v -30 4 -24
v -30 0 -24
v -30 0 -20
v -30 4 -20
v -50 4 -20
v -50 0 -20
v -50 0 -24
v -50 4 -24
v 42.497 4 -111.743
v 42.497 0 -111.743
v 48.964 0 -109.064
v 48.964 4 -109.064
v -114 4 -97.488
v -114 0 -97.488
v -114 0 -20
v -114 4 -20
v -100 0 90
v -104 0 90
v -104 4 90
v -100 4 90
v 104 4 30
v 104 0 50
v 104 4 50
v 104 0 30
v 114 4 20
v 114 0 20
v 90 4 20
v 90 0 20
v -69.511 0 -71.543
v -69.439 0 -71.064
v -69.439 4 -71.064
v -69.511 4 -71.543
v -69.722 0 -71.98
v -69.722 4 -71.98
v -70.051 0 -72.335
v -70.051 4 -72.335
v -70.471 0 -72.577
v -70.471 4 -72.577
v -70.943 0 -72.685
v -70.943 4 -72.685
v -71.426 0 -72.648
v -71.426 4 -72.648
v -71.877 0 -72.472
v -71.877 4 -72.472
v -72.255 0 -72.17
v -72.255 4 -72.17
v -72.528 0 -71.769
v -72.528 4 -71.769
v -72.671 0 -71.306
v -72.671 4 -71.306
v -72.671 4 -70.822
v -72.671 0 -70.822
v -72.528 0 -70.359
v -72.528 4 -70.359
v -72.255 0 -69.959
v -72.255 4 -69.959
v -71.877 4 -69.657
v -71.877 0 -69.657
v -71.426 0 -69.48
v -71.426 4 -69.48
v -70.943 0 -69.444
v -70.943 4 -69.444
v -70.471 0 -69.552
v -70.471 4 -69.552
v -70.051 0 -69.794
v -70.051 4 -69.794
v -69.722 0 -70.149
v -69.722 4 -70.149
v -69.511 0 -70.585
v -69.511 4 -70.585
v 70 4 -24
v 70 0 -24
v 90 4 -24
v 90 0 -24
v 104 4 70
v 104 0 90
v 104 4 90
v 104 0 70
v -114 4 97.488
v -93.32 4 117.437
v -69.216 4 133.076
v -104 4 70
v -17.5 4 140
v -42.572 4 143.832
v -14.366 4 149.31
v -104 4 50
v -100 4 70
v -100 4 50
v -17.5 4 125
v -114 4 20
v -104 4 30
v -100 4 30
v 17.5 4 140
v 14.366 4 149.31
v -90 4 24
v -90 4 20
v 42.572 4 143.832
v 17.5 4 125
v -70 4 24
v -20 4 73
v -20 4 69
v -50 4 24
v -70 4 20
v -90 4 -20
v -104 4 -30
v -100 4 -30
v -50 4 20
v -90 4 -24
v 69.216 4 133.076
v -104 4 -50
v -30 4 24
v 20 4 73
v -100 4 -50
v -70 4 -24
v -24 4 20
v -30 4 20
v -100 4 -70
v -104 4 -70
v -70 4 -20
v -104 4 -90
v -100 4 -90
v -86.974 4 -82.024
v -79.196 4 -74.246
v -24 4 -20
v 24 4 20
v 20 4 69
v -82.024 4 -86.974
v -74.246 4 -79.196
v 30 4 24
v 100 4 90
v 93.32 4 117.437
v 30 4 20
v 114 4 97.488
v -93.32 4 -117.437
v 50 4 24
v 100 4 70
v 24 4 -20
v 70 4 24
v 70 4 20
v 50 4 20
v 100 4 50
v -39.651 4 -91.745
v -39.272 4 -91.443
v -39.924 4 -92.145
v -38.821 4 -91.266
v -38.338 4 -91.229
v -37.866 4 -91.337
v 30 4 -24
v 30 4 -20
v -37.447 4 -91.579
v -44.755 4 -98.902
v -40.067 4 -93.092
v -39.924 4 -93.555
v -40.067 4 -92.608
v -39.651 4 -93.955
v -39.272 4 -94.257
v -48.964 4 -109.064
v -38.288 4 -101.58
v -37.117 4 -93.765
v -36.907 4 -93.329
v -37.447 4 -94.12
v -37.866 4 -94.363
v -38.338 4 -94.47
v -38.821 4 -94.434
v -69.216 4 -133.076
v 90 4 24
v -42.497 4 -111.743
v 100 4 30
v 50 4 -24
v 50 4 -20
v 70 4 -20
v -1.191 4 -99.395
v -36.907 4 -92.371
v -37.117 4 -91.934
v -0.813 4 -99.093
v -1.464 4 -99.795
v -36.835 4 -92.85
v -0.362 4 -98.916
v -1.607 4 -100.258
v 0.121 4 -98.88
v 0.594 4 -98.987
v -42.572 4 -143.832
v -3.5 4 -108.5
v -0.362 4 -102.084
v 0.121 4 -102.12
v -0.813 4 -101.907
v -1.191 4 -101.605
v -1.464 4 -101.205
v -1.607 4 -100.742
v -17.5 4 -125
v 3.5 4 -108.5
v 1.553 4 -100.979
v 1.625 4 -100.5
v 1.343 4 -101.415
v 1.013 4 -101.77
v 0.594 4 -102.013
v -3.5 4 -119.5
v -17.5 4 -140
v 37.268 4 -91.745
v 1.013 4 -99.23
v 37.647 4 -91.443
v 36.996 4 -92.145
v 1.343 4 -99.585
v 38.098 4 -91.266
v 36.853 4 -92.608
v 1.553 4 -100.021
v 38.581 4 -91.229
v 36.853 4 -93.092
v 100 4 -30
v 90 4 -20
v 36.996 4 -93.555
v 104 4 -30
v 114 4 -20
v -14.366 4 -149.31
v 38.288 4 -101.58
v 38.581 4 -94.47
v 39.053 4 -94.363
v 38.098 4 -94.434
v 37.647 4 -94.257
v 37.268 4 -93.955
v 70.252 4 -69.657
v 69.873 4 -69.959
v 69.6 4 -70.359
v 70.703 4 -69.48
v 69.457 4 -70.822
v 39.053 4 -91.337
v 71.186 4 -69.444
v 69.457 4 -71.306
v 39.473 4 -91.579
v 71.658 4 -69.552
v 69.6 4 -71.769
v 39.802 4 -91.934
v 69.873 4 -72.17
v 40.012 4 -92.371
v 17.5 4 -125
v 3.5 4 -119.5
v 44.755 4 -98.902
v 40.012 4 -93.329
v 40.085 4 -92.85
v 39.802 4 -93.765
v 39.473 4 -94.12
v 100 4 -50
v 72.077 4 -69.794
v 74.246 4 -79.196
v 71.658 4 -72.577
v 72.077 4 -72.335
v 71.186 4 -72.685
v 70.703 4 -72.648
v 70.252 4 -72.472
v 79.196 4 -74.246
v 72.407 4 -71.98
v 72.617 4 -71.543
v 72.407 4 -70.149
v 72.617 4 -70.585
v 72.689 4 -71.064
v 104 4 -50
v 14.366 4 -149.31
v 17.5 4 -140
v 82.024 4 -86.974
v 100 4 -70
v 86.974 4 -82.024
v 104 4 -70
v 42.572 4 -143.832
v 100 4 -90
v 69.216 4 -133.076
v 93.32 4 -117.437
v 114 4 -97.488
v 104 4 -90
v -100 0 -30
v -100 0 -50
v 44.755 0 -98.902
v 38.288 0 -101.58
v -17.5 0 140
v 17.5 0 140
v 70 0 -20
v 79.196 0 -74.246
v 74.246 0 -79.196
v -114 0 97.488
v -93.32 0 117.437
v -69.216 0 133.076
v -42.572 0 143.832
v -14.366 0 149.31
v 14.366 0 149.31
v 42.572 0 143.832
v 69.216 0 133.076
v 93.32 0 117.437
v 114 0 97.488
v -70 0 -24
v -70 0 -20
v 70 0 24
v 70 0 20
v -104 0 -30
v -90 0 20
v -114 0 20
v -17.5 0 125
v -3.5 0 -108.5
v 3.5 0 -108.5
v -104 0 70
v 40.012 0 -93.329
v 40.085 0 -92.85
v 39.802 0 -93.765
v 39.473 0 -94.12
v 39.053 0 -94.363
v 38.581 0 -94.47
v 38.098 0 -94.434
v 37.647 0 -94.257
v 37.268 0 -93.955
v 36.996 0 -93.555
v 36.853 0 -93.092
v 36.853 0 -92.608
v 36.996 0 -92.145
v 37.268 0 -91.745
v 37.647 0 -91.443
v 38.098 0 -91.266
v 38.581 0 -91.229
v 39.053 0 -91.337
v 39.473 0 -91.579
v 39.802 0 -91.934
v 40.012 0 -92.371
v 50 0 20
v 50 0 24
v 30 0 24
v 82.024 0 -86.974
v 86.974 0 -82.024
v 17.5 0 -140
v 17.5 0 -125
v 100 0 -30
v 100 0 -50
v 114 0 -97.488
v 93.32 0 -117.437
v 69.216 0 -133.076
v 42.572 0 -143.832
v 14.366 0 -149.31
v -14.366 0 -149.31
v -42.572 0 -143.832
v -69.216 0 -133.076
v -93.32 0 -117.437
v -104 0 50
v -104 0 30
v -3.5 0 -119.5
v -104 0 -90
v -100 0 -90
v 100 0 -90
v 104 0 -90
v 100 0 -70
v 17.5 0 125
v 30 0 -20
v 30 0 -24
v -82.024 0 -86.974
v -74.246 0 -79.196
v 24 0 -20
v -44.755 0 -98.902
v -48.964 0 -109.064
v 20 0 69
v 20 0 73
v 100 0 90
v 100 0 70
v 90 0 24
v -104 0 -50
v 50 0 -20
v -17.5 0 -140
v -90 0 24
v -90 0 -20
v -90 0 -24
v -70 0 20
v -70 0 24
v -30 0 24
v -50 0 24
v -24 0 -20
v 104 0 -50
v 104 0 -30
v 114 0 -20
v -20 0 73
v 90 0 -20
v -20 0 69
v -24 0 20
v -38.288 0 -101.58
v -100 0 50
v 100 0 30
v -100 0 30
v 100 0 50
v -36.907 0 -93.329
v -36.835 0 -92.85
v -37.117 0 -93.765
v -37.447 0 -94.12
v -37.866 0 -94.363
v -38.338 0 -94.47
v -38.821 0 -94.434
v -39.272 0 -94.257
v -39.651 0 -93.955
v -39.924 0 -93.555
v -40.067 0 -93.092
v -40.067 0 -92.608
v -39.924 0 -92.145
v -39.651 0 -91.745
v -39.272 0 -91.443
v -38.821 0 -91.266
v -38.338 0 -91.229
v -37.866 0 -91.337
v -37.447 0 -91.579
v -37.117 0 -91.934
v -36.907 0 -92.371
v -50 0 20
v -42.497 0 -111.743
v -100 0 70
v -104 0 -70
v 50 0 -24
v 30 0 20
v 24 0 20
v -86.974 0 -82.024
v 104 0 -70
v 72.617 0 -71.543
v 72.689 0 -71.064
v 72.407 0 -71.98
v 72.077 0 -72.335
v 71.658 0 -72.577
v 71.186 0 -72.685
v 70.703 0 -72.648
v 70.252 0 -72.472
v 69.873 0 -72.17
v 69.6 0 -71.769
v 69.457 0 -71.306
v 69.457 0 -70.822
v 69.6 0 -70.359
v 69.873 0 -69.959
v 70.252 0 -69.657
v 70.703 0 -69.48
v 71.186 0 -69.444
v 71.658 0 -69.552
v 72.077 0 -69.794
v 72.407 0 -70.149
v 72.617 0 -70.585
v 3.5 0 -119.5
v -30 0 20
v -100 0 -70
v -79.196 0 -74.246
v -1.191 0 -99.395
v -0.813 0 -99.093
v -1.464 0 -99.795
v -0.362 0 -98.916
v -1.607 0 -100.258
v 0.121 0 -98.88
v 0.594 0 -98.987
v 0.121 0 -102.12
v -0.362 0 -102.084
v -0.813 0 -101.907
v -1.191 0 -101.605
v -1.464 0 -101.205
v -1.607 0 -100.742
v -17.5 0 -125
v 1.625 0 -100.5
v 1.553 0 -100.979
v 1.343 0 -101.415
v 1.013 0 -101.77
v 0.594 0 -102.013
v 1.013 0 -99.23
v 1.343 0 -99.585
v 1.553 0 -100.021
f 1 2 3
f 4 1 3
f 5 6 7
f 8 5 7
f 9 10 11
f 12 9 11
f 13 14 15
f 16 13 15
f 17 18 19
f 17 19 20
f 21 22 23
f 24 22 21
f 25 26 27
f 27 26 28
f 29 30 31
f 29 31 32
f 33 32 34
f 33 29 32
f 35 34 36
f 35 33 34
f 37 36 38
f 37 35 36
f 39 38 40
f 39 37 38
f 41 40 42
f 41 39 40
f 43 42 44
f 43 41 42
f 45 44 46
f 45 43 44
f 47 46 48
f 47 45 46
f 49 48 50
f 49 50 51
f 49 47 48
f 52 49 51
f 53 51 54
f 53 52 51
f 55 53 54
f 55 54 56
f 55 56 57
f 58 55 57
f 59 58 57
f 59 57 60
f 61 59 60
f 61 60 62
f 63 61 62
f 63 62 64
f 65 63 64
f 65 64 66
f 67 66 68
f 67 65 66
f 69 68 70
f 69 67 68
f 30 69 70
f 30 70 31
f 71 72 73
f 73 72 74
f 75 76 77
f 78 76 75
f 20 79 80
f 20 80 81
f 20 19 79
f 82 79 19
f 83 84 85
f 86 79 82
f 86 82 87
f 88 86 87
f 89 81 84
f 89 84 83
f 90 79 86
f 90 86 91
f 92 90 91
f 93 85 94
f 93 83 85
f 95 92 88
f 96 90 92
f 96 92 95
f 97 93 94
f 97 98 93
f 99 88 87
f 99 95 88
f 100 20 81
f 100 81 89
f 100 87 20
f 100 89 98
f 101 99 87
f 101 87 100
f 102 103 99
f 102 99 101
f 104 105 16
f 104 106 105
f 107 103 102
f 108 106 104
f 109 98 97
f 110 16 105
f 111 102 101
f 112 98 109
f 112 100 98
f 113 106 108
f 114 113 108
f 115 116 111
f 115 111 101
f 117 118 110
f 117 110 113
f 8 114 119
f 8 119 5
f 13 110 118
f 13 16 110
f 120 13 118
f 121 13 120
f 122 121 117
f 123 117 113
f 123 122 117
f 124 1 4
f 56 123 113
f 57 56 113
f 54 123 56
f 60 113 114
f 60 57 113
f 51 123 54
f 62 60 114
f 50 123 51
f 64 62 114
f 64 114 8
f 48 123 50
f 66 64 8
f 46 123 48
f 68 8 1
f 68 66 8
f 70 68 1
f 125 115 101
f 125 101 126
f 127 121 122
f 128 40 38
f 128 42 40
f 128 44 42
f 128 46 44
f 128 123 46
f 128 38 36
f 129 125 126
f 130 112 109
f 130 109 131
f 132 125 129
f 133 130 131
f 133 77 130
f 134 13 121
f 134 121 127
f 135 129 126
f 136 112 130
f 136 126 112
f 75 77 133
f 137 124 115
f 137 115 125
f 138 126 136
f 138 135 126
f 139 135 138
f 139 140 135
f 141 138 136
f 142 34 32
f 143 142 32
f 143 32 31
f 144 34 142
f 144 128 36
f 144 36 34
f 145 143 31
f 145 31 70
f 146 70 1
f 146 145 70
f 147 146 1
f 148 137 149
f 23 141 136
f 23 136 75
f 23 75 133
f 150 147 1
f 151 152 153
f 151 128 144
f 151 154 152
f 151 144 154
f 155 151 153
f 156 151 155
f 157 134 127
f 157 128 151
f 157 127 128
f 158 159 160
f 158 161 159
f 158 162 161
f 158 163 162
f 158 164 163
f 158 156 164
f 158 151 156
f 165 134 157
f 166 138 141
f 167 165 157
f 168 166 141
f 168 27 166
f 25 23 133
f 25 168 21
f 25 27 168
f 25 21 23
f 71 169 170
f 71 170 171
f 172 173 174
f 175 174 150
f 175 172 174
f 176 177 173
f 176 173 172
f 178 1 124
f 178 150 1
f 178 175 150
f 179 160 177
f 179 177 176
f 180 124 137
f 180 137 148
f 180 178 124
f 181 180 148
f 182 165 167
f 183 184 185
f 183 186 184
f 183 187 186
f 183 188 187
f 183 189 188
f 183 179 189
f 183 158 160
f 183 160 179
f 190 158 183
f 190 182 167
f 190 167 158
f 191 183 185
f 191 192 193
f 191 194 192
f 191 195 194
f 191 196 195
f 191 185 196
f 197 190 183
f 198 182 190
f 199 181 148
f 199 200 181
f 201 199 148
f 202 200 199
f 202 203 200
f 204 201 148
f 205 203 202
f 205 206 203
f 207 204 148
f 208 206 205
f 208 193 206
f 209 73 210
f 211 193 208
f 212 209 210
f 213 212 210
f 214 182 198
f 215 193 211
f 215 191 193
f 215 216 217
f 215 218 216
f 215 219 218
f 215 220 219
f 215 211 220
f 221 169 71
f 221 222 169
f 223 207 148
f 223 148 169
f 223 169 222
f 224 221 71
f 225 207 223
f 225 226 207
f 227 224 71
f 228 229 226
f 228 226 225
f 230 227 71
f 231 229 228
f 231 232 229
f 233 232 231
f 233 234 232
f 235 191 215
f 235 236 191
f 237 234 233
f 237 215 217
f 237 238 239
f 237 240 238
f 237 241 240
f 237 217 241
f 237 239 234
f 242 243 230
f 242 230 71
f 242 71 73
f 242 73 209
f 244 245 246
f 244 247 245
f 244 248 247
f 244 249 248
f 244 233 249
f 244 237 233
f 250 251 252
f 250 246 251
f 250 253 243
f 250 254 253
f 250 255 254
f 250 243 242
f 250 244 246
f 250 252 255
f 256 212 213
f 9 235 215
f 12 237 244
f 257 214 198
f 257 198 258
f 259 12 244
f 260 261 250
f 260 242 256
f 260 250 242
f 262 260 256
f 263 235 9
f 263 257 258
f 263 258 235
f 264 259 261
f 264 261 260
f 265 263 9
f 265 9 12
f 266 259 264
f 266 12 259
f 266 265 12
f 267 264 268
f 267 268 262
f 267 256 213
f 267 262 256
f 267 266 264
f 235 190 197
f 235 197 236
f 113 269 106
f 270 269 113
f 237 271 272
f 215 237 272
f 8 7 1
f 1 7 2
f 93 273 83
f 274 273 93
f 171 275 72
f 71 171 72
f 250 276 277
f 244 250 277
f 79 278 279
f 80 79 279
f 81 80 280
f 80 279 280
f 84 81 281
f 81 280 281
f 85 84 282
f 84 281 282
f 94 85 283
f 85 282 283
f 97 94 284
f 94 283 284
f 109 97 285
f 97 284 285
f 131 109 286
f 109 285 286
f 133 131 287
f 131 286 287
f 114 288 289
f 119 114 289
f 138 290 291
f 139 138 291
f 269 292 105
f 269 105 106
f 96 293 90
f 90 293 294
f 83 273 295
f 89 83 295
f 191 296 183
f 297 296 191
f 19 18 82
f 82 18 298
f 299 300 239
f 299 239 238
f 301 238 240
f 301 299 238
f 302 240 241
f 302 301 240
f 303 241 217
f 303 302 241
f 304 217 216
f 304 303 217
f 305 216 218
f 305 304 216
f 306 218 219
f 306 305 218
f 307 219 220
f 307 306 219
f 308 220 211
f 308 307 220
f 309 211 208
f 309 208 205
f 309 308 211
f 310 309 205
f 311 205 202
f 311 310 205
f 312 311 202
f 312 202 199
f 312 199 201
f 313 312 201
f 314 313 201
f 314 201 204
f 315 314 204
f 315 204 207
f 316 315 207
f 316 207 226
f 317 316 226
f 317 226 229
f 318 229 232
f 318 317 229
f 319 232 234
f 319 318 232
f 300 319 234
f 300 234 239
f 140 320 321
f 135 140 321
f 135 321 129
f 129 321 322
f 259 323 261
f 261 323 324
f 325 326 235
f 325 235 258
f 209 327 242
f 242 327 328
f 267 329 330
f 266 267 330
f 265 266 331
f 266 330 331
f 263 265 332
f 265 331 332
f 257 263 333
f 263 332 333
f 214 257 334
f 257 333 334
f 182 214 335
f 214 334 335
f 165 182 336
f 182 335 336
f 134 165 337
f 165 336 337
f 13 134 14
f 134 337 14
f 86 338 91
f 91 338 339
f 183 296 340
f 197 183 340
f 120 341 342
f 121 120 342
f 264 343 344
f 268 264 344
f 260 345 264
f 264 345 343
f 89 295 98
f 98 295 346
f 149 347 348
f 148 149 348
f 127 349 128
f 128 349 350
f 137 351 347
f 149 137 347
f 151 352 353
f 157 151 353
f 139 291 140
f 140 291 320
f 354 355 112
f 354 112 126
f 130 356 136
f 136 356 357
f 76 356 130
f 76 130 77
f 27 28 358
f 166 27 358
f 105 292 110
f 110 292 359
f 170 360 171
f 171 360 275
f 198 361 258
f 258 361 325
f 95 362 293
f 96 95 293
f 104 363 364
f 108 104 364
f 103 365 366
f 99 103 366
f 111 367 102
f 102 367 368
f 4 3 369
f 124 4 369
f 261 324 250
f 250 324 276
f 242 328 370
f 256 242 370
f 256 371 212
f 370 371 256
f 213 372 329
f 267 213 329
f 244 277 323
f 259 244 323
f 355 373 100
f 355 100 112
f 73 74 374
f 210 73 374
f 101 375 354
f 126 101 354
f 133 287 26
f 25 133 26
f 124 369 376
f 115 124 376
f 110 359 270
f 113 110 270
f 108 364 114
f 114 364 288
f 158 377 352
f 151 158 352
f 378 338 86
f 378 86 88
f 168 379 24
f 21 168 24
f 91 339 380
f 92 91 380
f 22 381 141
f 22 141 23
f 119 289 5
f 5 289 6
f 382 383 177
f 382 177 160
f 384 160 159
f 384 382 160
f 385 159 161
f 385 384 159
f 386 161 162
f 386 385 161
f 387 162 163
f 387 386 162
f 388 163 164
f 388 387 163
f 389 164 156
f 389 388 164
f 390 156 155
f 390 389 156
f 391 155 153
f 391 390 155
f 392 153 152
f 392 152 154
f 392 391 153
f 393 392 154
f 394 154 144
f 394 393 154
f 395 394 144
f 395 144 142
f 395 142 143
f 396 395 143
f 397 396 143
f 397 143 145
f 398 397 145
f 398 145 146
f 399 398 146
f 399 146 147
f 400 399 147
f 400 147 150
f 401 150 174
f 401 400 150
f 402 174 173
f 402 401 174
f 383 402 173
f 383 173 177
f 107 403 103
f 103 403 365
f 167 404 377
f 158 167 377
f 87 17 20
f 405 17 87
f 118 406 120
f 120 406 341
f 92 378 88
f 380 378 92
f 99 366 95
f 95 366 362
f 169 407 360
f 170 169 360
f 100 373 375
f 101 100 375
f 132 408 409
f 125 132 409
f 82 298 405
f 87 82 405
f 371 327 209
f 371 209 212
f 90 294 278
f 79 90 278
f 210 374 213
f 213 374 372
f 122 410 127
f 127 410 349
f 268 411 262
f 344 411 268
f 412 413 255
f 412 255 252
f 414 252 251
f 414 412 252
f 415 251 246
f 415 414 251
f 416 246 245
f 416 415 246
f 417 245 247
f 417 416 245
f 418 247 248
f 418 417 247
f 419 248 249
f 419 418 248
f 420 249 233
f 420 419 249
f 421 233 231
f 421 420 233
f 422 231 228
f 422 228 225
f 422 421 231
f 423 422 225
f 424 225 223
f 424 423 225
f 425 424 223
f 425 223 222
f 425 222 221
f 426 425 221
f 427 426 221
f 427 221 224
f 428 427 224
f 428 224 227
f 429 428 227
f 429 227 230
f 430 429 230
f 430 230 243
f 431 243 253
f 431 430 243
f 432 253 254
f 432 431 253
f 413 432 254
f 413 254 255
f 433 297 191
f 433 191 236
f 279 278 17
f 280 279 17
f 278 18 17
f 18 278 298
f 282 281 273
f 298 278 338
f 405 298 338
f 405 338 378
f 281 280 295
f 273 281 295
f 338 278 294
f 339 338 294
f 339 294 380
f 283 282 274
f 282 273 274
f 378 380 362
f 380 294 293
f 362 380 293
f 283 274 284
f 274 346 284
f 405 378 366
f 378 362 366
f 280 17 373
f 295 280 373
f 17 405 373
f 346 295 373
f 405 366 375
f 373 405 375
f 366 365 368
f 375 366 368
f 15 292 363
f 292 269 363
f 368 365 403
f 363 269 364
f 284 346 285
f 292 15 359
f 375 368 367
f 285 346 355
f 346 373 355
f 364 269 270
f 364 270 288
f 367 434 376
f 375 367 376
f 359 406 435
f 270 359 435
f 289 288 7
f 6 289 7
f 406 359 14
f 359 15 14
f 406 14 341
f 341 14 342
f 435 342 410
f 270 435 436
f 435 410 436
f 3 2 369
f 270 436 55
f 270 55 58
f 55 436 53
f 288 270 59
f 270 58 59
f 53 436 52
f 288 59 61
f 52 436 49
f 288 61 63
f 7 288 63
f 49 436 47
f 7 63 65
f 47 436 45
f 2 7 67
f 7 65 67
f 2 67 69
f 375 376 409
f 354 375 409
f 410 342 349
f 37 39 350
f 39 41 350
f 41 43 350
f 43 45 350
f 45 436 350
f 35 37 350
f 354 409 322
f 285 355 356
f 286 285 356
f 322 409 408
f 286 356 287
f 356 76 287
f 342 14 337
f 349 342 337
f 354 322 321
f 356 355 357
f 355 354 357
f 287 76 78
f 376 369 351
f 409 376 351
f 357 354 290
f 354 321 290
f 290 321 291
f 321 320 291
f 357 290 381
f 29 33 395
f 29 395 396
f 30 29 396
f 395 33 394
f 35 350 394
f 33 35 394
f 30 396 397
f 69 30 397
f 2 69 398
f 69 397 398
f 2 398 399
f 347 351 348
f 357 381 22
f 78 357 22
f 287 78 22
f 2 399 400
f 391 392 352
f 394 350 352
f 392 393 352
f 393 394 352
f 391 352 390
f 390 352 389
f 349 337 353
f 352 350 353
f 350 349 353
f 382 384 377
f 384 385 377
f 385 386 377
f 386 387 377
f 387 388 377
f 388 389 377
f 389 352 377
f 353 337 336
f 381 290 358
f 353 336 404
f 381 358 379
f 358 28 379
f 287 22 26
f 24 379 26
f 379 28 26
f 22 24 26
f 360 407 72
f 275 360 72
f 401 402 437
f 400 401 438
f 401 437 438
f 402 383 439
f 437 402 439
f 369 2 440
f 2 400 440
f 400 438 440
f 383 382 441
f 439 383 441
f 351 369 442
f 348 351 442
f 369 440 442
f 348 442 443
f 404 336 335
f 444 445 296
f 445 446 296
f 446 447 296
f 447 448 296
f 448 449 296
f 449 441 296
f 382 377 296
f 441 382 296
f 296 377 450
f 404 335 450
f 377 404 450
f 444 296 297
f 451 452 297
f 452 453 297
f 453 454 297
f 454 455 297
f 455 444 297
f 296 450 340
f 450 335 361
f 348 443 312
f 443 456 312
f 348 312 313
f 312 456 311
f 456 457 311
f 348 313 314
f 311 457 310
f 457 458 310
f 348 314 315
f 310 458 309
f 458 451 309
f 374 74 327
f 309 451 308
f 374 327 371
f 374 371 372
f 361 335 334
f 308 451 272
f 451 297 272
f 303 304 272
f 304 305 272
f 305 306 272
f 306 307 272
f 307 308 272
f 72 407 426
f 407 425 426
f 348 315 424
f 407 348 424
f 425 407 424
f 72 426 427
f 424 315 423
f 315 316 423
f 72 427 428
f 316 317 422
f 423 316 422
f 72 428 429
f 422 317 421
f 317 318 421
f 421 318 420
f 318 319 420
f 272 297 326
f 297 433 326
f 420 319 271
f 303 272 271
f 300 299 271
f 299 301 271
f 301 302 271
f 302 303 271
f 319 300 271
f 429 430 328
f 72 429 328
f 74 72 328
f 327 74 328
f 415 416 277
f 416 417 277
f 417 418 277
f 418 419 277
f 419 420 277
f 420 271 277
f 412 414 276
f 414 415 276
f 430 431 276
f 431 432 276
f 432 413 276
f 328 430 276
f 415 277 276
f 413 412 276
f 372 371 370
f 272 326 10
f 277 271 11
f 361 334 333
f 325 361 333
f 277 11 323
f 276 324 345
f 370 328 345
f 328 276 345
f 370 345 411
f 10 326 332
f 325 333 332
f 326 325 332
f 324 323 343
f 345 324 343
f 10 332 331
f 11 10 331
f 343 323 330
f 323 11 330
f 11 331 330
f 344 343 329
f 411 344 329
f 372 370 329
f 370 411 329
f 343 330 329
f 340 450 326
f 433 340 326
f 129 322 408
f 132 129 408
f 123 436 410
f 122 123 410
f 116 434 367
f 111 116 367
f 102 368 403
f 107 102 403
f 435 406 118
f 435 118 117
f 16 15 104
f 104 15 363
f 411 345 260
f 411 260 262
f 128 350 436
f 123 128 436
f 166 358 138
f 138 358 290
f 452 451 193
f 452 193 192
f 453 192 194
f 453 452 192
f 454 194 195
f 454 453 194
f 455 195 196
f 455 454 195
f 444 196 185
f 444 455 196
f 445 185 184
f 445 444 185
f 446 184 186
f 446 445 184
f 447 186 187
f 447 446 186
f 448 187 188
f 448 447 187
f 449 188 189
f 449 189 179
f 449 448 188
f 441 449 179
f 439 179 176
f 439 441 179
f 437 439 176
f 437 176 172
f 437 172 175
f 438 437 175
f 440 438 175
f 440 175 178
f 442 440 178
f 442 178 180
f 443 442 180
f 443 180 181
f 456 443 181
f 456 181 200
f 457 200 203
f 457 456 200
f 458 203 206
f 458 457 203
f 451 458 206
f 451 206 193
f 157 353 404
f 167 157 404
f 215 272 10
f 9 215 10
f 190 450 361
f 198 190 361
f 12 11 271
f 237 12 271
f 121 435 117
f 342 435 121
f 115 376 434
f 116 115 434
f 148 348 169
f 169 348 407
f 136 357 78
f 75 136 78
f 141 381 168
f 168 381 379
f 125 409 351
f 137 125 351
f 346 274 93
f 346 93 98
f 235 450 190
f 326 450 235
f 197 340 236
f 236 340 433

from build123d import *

# Parameters (mm, degrees)
SKICA1_W                = 35
SKICA1_H                = 15
SKICA1_W_2              = 40
SKICA1_H_2              = 4
SKICA1_R                = 1.625
SKICA1_W_3              = 7
SKICA1_H_3              = 11
SKICA1_W_4              = 4
SKICA1_H_4              = 20
P_IDAT_VYSUNUT_M1_DEPTH = 4


with BuildPart() as part:
    # Skica1 → Přidat vysunutím1 (new body)
    with BuildSketch(Plane(origin=(0, 0, 0), x_dir=(1, 0, 0), z_dir=(0, 1, 0))):
        with BuildLine():
            Line((-114, 97.488460856), (-114, 20))
            Line((-114, 20), (-90, 20))
            Line((-90, 20), (-90, 24))
            Line((-90, 24), (-70, 24))
            Line((-70, 24), (-70, 20))
            Line((-70, 20), (-50, 20))
            Line((-50, 20), (-50, 24))
            Line((-50, 24), (-30, 24))
            Line((-30, 24), (-30, 20))
            Line((-30, 20), (-24, 20))
            Line((-24, 20), (-24, -20))
            Line((-24, -20), (-30, -20))
            Line((-30, -20), (-30, -24))
            Line((-30, -24), (-50, -24))
            Line((-50, -24), (-50, -20))
            Line((-50, -20), (-70, -20))
            Line((-70, -20), (-70, -24))
            Line((-70, -24), (-90, -24))
            Line((-90, -24), (-90, -20))
            Line((-90, -20), (-114, -20))
            Line((-114, -20), (-114, -97.488460856))
            ThreePointArc((-114, -97.488460856), (0, -150), (114, -97.488460856))
            Line((114, -97.488460856), (114, -20))
            Line((114, -20), (90, -20))
            Line((90, -20), (90, -24))
            Line((90, -24), (70, -24))
            Line((70, -24), (70, -20))
            Line((70, -20), (50, -20))
            Line((50, -20), (50, -24))
            Line((50, -24), (30, -24))
            Line((30, -24), (30, -20))
            Line((30, -20), (24, -20))
            Line((24, -20), (24, 20))
            Line((24, 20), (30, 20))
            Line((30, 20), (30, 24))
            Line((30, 24), (50, 24))
            Line((50, 24), (50, 20))
            Line((50, 20), (70, 20))
            Line((70, 20), (70, 24))
            Line((70, 24), (90, 24))
            Line((90, 24), (90, 20))
            Line((90, 20), (114, 20))
            Line((114, 20), (114, 97.488460856))
            ThreePointArc((114, 97.488460856), (0, 150), (-114, 97.488460856))
        make_face()
        with Locations((0, -132.5)):
            Rectangle(SKICA1_W, SKICA1_H, mode=Mode.SUBTRACT)
        with Locations((0, -71)):
            Rectangle(SKICA1_W_2, SKICA1_H_2, mode=Mode.SUBTRACT)
        with Locations((0, 100.5)):
            Circle(SKICA1_R, mode=Mode.SUBTRACT)
        with Locations((0, 114)):
            Rectangle(SKICA1_W_3, SKICA1_H_3, mode=Mode.SUBTRACT)
        with Locations((0, 132.5)):
            Rectangle(SKICA1_W, SKICA1_H, mode=Mode.SUBTRACT)
        with Locations((-102, 40)):
            Rectangle(SKICA1_W_4, SKICA1_H_4, mode=Mode.SUBTRACT)
        with Locations((-71.064231509, 71.064231509)):
            Circle(SKICA1_R, mode=Mode.SUBTRACT)
        with Locations((-102, 80)):
            Rectangle(SKICA1_W_4, SKICA1_H_4, mode=Mode.SUBTRACT)
        Polygon((-86.974134086, 82.024386618), (-82.024386618, 86.974134086), (-74.246212025, 79.195959493), (-79.195959493, 74.246212025), align=None, mode=Mode.SUBTRACT)
        Polygon((-48.964248531, 109.064212122), (-42.497091804, 111.742996148), (-38.287574048, 101.580321291), (-44.754730775, 98.901537264), align=None, mode=Mode.SUBTRACT)
        with Locations((-38.459684953, 92.849893017)):
            Circle(SKICA1_R, mode=Mode.SUBTRACT)
        with Locations((-102, -40)):
            Rectangle(SKICA1_W_4, SKICA1_H_4, mode=Mode.SUBTRACT)
        with Locations((-102, -80)):
            Rectangle(SKICA1_W_4, SKICA1_H_4, mode=Mode.SUBTRACT)
        with Locations((102, 80)):
            Rectangle(SKICA1_W_4, SKICA1_H_4, mode=Mode.SUBTRACT)
        with Locations((71.064231509, 71.064231509)):
            Circle(SKICA1_R, mode=Mode.SUBTRACT)
        with Locations((102, 40)):
            Rectangle(SKICA1_W_4, SKICA1_H_4, mode=Mode.SUBTRACT)
        with Locations((38.459684953, 92.849893017)):
            Circle(SKICA1_R, mode=Mode.SUBTRACT)
        Polygon((82.024386618, 86.974134086), (86.974134086, 82.024386618), (79.195959493, 74.246212025), (74.246212025, 79.195959493), align=None, mode=Mode.SUBTRACT)
        Polygon((42.497091804, 111.742996148), (48.964248531, 109.064212122), (44.754730775, 98.901537264), (38.287574048, 101.580321291), align=None, mode=Mode.SUBTRACT)
        with Locations((102, -40)):
            Rectangle(SKICA1_W_4, SKICA1_H_4, mode=Mode.SUBTRACT)
        with Locations((102, -80)):
            Rectangle(SKICA1_W_4, SKICA1_H_4, mode=Mode.SUBTRACT)
    extrude(amount=P_IDAT_VYSUNUT_M1_DEPTH)


solid = part.part
